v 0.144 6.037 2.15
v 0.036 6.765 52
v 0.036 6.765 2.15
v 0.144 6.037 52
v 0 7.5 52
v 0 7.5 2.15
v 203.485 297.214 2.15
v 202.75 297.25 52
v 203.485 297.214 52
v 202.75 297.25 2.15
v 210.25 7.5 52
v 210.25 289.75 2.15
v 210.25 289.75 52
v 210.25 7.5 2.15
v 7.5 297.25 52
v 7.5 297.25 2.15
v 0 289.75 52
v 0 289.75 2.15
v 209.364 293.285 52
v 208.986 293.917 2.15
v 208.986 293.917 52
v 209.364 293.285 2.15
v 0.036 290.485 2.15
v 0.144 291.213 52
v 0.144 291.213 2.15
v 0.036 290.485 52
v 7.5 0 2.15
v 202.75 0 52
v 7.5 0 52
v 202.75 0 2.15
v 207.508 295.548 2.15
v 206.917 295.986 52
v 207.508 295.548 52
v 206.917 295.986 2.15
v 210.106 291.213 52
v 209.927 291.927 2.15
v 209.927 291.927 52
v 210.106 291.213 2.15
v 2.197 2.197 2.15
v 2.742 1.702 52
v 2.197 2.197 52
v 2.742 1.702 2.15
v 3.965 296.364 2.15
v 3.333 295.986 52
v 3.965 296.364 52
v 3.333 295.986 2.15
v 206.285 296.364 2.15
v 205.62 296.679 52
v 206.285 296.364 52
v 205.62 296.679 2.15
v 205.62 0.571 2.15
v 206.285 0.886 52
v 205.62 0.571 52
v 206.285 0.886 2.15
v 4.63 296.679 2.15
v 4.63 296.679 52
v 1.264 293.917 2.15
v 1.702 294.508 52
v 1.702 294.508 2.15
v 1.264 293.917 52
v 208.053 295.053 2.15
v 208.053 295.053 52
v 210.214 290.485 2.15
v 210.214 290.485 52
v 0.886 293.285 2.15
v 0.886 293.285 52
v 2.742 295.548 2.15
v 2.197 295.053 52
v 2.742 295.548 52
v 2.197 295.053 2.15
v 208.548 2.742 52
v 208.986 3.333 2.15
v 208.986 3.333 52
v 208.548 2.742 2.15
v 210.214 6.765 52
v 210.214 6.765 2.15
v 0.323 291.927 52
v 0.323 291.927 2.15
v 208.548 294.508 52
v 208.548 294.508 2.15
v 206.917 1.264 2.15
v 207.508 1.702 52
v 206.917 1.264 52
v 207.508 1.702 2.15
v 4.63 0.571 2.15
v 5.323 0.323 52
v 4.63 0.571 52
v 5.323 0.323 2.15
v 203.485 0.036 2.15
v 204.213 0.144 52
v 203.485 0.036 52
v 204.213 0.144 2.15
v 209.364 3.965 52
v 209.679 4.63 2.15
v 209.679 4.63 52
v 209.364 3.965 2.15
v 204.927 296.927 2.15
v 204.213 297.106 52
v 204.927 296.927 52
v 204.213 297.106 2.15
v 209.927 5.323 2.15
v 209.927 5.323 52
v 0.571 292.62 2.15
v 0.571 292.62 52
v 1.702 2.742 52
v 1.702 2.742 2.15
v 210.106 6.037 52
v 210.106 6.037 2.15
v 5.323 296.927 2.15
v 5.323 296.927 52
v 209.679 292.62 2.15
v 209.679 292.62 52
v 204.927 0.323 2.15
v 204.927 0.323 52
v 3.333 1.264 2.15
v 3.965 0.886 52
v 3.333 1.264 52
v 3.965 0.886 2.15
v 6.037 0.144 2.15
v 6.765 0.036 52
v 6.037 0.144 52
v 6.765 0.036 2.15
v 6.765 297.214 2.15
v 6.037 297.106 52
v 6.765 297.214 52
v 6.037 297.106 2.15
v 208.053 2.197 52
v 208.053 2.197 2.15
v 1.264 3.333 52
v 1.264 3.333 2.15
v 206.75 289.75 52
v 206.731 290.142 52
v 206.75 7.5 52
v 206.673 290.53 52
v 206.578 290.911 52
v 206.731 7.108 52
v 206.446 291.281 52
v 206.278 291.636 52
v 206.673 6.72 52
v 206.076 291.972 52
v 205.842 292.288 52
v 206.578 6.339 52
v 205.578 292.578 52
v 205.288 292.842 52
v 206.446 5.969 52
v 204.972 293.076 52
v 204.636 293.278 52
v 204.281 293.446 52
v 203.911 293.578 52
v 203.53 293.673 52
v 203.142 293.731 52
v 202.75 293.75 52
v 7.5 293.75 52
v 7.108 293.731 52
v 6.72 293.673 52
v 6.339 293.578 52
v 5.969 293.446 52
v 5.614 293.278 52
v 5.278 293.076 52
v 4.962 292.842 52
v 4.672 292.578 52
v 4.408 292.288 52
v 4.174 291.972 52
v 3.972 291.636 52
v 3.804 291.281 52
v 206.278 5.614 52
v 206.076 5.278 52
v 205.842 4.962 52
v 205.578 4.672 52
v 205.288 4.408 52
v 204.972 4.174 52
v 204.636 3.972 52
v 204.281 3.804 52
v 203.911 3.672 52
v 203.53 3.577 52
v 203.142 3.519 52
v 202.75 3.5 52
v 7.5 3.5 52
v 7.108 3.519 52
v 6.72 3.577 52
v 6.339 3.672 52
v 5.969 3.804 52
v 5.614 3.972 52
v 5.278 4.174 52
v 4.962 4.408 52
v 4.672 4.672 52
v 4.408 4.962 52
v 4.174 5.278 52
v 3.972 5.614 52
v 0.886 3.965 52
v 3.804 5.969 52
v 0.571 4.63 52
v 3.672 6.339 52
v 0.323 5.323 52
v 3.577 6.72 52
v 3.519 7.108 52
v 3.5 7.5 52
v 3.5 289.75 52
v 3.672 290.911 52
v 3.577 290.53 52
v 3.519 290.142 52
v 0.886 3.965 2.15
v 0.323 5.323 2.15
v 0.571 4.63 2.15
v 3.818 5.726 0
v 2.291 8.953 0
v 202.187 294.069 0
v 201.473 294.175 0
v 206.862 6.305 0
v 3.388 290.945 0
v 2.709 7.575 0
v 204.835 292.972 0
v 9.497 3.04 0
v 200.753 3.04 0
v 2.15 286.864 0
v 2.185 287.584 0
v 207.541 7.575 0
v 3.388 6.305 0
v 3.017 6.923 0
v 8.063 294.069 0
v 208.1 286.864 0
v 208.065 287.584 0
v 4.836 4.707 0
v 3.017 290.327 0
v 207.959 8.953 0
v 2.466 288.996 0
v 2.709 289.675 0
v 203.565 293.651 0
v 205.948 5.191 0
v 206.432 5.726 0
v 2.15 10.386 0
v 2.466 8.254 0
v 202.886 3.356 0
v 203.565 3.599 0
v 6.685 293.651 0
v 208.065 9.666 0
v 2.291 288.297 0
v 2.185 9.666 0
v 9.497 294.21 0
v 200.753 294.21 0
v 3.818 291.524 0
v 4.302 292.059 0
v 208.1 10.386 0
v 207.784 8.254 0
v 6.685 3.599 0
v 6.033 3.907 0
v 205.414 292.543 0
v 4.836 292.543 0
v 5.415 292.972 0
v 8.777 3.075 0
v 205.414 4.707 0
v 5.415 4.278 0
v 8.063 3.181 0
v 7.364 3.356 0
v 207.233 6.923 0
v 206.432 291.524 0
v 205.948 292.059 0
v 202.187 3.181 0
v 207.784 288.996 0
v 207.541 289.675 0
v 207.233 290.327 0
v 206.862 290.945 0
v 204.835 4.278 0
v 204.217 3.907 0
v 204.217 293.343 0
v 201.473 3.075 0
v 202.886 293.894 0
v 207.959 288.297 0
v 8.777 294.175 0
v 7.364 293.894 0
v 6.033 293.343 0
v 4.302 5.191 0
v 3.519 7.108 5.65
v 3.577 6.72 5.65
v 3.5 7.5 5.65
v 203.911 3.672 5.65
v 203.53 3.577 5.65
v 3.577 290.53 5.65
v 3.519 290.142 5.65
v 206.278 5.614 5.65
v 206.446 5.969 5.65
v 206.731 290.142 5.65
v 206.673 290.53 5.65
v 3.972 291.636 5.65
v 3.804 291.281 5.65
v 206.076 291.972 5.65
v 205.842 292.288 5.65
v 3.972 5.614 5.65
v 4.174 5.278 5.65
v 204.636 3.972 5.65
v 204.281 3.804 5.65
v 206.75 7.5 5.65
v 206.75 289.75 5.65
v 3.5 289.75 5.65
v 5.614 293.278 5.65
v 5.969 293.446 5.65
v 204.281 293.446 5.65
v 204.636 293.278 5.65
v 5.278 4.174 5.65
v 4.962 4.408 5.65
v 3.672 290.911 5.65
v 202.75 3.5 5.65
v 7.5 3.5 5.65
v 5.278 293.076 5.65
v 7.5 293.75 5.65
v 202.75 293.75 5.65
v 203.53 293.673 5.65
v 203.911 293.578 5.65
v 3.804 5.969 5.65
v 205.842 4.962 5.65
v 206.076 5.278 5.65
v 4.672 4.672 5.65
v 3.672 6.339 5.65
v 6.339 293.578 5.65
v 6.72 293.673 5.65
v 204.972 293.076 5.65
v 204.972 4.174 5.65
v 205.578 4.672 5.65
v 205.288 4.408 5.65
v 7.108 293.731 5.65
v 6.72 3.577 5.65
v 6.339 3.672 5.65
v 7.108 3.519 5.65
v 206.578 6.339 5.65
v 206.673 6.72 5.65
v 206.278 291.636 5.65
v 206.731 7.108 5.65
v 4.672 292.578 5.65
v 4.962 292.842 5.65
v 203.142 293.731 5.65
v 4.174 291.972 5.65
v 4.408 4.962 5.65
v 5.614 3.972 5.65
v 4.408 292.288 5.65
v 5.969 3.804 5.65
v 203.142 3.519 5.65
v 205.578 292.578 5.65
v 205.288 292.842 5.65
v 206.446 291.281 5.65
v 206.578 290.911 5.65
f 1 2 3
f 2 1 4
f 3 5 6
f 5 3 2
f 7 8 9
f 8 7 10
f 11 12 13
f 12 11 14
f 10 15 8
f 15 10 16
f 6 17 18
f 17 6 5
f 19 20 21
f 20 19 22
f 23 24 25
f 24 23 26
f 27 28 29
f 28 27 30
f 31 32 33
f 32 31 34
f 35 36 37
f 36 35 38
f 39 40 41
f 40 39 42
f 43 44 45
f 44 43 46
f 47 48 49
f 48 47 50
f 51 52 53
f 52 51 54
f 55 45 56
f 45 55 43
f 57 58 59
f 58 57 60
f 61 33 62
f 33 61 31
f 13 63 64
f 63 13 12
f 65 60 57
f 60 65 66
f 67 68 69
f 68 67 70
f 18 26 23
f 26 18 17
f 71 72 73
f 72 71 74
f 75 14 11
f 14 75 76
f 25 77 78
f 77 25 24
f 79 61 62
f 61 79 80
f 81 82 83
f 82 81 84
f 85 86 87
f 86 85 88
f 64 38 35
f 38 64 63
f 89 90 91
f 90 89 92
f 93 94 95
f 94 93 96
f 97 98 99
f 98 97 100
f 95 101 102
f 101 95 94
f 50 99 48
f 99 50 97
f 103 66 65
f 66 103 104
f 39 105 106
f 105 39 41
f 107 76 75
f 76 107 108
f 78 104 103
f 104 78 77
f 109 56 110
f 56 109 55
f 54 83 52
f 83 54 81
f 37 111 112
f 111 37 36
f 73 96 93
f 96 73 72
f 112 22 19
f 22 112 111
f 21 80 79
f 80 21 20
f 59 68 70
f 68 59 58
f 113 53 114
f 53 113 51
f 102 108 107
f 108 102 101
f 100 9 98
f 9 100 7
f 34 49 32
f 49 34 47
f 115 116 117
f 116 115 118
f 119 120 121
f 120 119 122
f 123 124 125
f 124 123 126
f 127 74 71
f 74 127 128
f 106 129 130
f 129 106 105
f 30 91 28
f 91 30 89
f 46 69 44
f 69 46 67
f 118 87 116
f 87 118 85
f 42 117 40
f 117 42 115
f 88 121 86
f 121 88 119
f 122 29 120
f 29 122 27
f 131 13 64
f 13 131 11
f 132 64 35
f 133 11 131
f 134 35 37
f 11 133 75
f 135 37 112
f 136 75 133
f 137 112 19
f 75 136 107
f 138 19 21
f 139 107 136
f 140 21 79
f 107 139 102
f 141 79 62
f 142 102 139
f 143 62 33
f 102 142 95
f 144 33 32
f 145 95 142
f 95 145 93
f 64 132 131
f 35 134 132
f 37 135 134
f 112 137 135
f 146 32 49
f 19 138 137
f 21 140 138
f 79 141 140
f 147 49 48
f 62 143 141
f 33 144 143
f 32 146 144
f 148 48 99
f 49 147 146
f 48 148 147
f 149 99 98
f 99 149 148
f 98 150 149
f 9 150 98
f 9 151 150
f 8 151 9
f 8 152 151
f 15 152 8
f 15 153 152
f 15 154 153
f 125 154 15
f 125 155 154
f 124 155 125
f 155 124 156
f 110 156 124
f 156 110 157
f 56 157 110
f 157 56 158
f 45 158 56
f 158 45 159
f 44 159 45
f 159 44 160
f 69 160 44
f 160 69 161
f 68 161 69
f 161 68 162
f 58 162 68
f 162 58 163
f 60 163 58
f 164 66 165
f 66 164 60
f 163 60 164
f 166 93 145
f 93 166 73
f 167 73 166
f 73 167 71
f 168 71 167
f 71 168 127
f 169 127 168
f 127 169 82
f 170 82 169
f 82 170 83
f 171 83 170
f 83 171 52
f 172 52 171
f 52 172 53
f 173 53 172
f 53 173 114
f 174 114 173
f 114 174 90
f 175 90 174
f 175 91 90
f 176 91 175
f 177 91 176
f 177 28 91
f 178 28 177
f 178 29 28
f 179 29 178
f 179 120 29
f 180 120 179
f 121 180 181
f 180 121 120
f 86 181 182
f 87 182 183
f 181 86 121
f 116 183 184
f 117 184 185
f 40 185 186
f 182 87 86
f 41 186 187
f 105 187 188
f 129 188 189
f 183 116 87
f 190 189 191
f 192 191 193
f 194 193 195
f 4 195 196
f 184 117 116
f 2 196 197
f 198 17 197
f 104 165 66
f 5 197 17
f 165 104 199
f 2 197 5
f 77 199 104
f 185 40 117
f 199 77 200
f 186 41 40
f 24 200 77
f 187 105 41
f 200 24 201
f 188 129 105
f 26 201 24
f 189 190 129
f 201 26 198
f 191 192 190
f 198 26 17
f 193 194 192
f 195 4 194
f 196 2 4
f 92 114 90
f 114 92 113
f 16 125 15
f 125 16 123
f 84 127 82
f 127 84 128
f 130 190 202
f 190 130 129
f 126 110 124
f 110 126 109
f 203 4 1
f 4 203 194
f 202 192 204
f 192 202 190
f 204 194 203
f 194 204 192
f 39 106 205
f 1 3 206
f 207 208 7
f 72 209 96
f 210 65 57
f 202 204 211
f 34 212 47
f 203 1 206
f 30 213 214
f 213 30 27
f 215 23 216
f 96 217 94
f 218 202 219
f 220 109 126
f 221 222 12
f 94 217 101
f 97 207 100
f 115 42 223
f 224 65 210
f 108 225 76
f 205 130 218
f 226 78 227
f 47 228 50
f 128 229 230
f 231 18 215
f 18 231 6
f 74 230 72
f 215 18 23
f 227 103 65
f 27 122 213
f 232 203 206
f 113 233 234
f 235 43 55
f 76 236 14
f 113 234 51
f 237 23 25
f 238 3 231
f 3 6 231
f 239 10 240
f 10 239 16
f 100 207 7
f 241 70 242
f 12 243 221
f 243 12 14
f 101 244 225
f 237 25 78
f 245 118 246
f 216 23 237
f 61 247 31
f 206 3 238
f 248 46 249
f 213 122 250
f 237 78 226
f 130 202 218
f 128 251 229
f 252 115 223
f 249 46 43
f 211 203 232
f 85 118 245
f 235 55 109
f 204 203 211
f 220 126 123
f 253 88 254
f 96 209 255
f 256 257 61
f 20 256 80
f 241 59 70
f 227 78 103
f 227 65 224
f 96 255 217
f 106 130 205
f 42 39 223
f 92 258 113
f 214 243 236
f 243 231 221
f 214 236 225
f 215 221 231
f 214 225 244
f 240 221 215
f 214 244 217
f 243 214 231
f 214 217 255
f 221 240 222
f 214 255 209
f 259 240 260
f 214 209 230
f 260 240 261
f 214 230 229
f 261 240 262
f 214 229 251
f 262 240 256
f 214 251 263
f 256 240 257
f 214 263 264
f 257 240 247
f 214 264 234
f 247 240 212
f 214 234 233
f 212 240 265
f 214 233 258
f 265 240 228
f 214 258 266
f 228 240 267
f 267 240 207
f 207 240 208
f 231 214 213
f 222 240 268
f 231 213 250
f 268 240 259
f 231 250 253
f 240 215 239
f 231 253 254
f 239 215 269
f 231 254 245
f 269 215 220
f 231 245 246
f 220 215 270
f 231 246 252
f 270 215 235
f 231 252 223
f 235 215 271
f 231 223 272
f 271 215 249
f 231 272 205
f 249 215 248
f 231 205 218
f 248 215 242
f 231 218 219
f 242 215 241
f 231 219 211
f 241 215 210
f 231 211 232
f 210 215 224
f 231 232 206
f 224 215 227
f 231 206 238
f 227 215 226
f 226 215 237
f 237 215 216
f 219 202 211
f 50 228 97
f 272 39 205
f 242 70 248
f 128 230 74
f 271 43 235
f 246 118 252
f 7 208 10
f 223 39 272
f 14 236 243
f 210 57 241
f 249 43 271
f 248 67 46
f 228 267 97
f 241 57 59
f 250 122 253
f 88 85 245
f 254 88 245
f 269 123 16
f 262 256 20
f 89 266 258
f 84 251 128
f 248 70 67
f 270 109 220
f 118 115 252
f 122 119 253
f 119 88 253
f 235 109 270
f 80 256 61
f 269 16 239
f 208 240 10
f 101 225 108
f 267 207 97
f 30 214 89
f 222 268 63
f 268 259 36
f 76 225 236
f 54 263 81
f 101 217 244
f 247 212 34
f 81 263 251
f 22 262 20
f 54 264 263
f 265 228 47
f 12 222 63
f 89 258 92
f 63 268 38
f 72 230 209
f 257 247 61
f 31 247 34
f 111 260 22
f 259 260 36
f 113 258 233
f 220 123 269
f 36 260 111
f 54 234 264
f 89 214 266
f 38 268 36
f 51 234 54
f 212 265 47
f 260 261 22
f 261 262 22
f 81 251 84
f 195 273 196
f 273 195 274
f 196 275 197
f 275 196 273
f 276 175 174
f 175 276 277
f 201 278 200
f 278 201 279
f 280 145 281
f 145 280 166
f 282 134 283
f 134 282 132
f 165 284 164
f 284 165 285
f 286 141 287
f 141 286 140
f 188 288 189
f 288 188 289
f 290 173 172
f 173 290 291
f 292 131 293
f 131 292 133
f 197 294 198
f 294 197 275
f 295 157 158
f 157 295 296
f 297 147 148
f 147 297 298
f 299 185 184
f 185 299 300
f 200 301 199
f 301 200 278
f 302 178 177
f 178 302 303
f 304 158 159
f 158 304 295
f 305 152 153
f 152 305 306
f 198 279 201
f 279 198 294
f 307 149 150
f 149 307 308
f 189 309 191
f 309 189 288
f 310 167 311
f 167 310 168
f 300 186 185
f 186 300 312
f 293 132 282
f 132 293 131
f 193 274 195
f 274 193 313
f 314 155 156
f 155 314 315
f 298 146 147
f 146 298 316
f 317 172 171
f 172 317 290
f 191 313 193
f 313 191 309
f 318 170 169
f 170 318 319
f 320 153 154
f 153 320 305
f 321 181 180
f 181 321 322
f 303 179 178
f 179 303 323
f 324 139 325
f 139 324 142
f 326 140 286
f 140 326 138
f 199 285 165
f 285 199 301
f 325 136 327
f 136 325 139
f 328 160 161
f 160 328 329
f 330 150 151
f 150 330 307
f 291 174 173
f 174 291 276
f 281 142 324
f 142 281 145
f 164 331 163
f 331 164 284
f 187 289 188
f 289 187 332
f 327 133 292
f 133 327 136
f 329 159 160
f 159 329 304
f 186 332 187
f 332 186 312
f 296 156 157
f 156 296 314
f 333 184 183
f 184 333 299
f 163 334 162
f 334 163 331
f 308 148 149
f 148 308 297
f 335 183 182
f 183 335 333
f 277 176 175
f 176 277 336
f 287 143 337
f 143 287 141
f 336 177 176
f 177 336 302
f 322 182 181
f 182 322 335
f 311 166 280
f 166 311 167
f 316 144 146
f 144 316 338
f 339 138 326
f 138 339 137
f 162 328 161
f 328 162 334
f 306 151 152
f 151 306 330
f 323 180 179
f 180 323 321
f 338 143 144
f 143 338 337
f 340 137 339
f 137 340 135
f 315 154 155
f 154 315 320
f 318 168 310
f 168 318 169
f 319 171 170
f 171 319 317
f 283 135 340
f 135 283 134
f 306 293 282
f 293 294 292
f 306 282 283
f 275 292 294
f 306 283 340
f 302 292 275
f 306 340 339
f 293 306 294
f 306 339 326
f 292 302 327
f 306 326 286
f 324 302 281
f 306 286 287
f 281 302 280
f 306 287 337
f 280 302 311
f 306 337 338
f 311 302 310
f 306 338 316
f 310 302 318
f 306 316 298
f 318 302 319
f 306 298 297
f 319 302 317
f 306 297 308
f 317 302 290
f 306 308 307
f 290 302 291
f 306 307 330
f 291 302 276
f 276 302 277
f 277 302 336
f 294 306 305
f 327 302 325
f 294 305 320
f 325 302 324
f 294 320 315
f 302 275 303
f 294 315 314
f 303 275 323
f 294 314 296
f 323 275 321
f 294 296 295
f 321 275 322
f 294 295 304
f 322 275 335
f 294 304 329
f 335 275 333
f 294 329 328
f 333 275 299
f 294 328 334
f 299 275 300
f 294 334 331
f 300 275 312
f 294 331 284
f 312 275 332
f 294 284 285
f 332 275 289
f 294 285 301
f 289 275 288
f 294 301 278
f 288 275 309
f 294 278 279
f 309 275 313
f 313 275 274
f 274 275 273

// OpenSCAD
// file: tools/iso.scad
// A0 x dimensions in mm
paramsIsoBaseBoxX = 841;
// A0 y dimensions in mm
paramsIsoBaseBoxY = 1189;

function keepVectorXMax(a, b) = a > b ? [b, a] : [a, b];

function isoPaper(base) = keepVectorXMax(
  paramsIsoBaseBoxX / pow(2, base / 2),
  paramsIsoBaseBoxY / pow(2, base / 2)
);
// file: models/rounded-cube.scad
module roundedCube(x, y, z, r, scale=1, reversed=false, center=false, angle=0) {
  extrudeScale = scale != 1 ? scale : (x - (z * tan(angle) * 2))/x;
  echo(str("roundedCube scale=", extrudeScale));
  // Determine final tranformations
  translateX = center ? 0 : x/2;
  translateY = center ? 0 : y/2;
  translateZ = reversed ? -1*z : 0;
  mirrorZ = reversed ? 1 : 0;

  mirror([0,0,mirrorZ]) 
    translate([translateX, translateY, translateZ])
      // Draw
      linear_extrude(height=z,scale=extrudeScale) {
        translate([-x/2, -y/2, 0]) hull() {
          translate([r, r, 0]) circle(r);
          translate([x - r, r, 0]) circle(r);
          translate([r, y - r, 0]) circle(r);
          translate([x - r, y - r, 0]) circle(r);
        }
      }
}

%translate([0,0,4]) roundedCube(60, 40, 20, 5);
translate([5,5,0]) roundedCube(50, 30, 4, 5, reversed = true, angle = 30);
// main file
///////////////////////
// Private Parameters //
///////////////////////

/* [Hidden] */
hiddenResolution = 64;
$fn = hiddenResolution;

use <models/rounded-cube.scad>
use <tools/iso.scad>

// Bottom stack unit z dimension
paramsStackShapeZ = 2.15;
// Bottom stack unit angle
paramsStackShapeAngle = 45;
// Base unit for box height
paramsBaseBoxZ = 26;

///////////////////////
// Public Parameters //
///////////////////////

/* [Sizes] */

// ISO-216 base size
Box_Size = 4; // [1:A1, 2:A2, 3:A3, 4:A4, 5:A5, 6:A6, 7:A7, 8:A8]
// Box height
Box_Height = 2; // [1:10]

/* [Advanced] */

// Base wall length
Wall_Length = 3.5;
// Rounded value
Wall_Rounded = 7.5;

module aBox(base, z) {
  paramsWallLength = Wall_Length;
  paramsRoundedH = Wall_Rounded;
  // Calculate dimensions for A(n)
  paperSize = isoPaper(base);
  boxX = paperSize[0];
  boxY = paperSize[1];
  boxZ = paramsBaseBoxZ * z;

  echo("==== ABox - configuration ====");
  echo(str("boxX=", boxX));
  echo(str("boxY=", boxY));
  echo(str("boxZ=", boxZ));
  echo(str("paramsWallLength=", paramsWallLength));
  echo(str("paramsRoundedH=", paramsRoundedH));
  echo(str("paramsStackShapeZ=", paramsStackShapeZ));
  echo(str("paramsStackShapeAngle=", paramsStackShapeAngle));

  
  // Output the dimensions
  echo(str("A", base, " dimensions: ", boxX, "mm x ", boxY, "mm"));

  difference() {
    union() {
      translate([0, 0, paramsStackShapeZ]) {
        roundedCube(boxX, boxY, boxZ - paramsStackShapeZ, paramsRoundedH);
      }
      translate([0, 0, 0]) {
        roundedCube(
          boxX,
          boxY,
          paramsStackShapeZ,
          paramsRoundedH,
          angle=paramsStackShapeAngle,
          reversed = true
        );
      }
    }
    translate([paramsWallLength, paramsWallLength, paramsStackShapeZ + paramsWallLength]) {
      roundedCube(
        boxX - paramsWallLength * 2,
        boxY - paramsWallLength * 2,
        boxZ - paramsStackShapeZ,
        paramsRoundedH > paramsWallLength ? paramsRoundedH - paramsWallLength : 0.1
      );
    }
  }
}

aBox(Box_Size, Box_Height);
